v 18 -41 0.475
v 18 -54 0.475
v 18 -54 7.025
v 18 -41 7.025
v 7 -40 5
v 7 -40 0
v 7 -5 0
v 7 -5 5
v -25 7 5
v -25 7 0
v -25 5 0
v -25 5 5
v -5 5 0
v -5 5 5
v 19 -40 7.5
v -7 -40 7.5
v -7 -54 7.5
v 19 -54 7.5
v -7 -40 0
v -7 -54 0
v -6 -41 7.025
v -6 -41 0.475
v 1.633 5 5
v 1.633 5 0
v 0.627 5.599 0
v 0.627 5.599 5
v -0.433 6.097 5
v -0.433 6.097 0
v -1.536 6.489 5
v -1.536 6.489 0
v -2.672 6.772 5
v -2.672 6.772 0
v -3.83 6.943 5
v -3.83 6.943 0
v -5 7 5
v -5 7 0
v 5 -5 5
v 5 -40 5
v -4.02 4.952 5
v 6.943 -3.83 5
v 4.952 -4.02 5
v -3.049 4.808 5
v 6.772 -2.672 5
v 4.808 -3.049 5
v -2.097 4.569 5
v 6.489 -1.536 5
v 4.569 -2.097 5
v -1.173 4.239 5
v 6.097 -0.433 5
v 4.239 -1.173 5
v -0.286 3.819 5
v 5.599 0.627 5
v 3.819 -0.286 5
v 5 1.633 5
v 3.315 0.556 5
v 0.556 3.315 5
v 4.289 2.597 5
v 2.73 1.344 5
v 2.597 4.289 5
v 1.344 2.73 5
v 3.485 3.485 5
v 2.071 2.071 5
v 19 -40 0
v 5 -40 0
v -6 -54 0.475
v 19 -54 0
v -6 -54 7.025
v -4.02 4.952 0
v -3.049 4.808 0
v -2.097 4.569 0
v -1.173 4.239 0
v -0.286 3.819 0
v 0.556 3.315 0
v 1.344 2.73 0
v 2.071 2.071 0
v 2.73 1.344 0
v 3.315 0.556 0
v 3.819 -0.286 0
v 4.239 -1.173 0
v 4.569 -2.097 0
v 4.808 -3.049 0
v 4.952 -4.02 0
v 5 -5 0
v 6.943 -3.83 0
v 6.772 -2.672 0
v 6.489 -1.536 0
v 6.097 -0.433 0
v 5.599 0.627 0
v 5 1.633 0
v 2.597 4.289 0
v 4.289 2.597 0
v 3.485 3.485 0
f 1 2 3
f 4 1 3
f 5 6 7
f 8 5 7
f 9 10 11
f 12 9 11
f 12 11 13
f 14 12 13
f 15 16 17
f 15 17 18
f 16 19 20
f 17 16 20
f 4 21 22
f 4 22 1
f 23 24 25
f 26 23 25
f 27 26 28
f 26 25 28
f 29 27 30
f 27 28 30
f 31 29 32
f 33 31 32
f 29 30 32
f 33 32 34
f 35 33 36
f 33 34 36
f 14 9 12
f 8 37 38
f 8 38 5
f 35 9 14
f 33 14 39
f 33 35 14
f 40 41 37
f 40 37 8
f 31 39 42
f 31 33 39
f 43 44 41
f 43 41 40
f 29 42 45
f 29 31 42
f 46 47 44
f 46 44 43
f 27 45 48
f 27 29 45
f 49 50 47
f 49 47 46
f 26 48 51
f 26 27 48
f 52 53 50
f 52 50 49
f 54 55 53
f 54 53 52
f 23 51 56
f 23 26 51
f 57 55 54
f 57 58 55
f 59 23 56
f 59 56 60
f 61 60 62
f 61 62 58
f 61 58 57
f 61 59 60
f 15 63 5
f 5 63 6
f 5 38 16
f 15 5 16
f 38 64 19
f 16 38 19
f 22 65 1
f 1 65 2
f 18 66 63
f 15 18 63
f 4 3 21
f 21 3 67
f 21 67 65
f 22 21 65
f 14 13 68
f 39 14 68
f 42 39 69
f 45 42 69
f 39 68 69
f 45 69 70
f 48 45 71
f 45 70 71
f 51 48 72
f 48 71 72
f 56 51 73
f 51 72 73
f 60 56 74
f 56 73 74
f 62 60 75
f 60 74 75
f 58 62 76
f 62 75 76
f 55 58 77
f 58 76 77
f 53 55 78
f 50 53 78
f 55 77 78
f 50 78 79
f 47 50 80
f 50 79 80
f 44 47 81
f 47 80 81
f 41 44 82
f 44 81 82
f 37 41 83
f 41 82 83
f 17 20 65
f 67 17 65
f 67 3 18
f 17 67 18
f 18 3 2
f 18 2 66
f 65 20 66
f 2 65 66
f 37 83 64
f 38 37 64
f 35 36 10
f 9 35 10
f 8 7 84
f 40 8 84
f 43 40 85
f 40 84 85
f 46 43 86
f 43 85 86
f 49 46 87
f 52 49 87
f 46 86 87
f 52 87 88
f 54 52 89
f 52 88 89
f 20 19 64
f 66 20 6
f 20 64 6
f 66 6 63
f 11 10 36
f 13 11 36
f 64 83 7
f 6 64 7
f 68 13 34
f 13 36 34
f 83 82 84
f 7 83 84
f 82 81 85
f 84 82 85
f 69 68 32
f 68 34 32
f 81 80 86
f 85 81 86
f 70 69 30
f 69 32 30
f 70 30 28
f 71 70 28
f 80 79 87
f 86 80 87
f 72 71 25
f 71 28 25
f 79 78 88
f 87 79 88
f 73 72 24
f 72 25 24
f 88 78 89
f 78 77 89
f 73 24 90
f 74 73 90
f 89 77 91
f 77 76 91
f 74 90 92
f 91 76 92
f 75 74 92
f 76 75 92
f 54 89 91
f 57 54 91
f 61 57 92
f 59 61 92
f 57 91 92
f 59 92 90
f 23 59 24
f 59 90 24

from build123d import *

# Parameters (mm, degrees)
F1_DEPTH = 5
F2_DEPTH = 7.5
F3_W     = 12
F3_H     = 3.275
F4_DEPTH = 13


with BuildPart() as f1:
    # F0 (on Top) → F1 (new body)
    with BuildSketch(Plane.XY):
        with BuildLine():
            Line((-25, 5), (-5, 5))
            Line((-5, 5), (1.6332495807, 5))
            ThreePointArc((1.6332495807, 5), (-1.5358983849, 6.4891252931), (-5, 7))
            Line((-5, 7), (-25, 7))
            Line((-25, 7), (-25, 6))
            Line((-25, 6), (-25, 5))
        make_face()
        with BuildLine():
            Line((1.6332495807, 5), (-5, 5))
            ThreePointArc((-5, 5), (2.0710678119, 2.0710678119), (5, -5))
            Line((5, -5), (5, 1.6332495807))
            ThreePointArc((5, 1.6332495807), (3.4852813742, 3.4852813742), (1.6332495807, 5))
        make_face()
        with BuildLine():
            Line((5, 1.6332495807), (5, -5))
            Line((5, -5), (5, -40))
            Line((5, -40), (6, -40))
            Line((6, -40), (7, -40))
            Line((7, -40), (7, -5))
            ThreePointArc((7, -5), (6.4891252931, -1.5358983849), (5, 1.6332495807))
        make_face()
    extrude(amount=F1_DEPTH)

    # F0 (on Top) → F2 (join)
    with BuildSketch(Plane.XY):
        Polygon((6, -40), (5, -40), (-7, -40), (-7, -54), (6, -54), align=None)
        Polygon((7, -40), (6, -40), (6, -54), (19, -54), (19, -40), align=None)
    extrude(amount=F2_DEPTH)

    # F3 (on face) → F4 (cut)
    with BuildSketch(Plane.XZ.offset(54)):
        with Locations((0, 5.3875)):
            Rectangle(F3_W, F3_H)
        with Locations((12, 5.3875)):
            Rectangle(F3_W, F3_H)
        with Locations((12, 2.1125)):
            Rectangle(F3_W, F3_H)
        with Locations((0, 2.1125)):
            Rectangle(F3_W, F3_H)
    extrude(amount=-F4_DEPTH, mode=Mode.SUBTRACT)


solid = f1.part
